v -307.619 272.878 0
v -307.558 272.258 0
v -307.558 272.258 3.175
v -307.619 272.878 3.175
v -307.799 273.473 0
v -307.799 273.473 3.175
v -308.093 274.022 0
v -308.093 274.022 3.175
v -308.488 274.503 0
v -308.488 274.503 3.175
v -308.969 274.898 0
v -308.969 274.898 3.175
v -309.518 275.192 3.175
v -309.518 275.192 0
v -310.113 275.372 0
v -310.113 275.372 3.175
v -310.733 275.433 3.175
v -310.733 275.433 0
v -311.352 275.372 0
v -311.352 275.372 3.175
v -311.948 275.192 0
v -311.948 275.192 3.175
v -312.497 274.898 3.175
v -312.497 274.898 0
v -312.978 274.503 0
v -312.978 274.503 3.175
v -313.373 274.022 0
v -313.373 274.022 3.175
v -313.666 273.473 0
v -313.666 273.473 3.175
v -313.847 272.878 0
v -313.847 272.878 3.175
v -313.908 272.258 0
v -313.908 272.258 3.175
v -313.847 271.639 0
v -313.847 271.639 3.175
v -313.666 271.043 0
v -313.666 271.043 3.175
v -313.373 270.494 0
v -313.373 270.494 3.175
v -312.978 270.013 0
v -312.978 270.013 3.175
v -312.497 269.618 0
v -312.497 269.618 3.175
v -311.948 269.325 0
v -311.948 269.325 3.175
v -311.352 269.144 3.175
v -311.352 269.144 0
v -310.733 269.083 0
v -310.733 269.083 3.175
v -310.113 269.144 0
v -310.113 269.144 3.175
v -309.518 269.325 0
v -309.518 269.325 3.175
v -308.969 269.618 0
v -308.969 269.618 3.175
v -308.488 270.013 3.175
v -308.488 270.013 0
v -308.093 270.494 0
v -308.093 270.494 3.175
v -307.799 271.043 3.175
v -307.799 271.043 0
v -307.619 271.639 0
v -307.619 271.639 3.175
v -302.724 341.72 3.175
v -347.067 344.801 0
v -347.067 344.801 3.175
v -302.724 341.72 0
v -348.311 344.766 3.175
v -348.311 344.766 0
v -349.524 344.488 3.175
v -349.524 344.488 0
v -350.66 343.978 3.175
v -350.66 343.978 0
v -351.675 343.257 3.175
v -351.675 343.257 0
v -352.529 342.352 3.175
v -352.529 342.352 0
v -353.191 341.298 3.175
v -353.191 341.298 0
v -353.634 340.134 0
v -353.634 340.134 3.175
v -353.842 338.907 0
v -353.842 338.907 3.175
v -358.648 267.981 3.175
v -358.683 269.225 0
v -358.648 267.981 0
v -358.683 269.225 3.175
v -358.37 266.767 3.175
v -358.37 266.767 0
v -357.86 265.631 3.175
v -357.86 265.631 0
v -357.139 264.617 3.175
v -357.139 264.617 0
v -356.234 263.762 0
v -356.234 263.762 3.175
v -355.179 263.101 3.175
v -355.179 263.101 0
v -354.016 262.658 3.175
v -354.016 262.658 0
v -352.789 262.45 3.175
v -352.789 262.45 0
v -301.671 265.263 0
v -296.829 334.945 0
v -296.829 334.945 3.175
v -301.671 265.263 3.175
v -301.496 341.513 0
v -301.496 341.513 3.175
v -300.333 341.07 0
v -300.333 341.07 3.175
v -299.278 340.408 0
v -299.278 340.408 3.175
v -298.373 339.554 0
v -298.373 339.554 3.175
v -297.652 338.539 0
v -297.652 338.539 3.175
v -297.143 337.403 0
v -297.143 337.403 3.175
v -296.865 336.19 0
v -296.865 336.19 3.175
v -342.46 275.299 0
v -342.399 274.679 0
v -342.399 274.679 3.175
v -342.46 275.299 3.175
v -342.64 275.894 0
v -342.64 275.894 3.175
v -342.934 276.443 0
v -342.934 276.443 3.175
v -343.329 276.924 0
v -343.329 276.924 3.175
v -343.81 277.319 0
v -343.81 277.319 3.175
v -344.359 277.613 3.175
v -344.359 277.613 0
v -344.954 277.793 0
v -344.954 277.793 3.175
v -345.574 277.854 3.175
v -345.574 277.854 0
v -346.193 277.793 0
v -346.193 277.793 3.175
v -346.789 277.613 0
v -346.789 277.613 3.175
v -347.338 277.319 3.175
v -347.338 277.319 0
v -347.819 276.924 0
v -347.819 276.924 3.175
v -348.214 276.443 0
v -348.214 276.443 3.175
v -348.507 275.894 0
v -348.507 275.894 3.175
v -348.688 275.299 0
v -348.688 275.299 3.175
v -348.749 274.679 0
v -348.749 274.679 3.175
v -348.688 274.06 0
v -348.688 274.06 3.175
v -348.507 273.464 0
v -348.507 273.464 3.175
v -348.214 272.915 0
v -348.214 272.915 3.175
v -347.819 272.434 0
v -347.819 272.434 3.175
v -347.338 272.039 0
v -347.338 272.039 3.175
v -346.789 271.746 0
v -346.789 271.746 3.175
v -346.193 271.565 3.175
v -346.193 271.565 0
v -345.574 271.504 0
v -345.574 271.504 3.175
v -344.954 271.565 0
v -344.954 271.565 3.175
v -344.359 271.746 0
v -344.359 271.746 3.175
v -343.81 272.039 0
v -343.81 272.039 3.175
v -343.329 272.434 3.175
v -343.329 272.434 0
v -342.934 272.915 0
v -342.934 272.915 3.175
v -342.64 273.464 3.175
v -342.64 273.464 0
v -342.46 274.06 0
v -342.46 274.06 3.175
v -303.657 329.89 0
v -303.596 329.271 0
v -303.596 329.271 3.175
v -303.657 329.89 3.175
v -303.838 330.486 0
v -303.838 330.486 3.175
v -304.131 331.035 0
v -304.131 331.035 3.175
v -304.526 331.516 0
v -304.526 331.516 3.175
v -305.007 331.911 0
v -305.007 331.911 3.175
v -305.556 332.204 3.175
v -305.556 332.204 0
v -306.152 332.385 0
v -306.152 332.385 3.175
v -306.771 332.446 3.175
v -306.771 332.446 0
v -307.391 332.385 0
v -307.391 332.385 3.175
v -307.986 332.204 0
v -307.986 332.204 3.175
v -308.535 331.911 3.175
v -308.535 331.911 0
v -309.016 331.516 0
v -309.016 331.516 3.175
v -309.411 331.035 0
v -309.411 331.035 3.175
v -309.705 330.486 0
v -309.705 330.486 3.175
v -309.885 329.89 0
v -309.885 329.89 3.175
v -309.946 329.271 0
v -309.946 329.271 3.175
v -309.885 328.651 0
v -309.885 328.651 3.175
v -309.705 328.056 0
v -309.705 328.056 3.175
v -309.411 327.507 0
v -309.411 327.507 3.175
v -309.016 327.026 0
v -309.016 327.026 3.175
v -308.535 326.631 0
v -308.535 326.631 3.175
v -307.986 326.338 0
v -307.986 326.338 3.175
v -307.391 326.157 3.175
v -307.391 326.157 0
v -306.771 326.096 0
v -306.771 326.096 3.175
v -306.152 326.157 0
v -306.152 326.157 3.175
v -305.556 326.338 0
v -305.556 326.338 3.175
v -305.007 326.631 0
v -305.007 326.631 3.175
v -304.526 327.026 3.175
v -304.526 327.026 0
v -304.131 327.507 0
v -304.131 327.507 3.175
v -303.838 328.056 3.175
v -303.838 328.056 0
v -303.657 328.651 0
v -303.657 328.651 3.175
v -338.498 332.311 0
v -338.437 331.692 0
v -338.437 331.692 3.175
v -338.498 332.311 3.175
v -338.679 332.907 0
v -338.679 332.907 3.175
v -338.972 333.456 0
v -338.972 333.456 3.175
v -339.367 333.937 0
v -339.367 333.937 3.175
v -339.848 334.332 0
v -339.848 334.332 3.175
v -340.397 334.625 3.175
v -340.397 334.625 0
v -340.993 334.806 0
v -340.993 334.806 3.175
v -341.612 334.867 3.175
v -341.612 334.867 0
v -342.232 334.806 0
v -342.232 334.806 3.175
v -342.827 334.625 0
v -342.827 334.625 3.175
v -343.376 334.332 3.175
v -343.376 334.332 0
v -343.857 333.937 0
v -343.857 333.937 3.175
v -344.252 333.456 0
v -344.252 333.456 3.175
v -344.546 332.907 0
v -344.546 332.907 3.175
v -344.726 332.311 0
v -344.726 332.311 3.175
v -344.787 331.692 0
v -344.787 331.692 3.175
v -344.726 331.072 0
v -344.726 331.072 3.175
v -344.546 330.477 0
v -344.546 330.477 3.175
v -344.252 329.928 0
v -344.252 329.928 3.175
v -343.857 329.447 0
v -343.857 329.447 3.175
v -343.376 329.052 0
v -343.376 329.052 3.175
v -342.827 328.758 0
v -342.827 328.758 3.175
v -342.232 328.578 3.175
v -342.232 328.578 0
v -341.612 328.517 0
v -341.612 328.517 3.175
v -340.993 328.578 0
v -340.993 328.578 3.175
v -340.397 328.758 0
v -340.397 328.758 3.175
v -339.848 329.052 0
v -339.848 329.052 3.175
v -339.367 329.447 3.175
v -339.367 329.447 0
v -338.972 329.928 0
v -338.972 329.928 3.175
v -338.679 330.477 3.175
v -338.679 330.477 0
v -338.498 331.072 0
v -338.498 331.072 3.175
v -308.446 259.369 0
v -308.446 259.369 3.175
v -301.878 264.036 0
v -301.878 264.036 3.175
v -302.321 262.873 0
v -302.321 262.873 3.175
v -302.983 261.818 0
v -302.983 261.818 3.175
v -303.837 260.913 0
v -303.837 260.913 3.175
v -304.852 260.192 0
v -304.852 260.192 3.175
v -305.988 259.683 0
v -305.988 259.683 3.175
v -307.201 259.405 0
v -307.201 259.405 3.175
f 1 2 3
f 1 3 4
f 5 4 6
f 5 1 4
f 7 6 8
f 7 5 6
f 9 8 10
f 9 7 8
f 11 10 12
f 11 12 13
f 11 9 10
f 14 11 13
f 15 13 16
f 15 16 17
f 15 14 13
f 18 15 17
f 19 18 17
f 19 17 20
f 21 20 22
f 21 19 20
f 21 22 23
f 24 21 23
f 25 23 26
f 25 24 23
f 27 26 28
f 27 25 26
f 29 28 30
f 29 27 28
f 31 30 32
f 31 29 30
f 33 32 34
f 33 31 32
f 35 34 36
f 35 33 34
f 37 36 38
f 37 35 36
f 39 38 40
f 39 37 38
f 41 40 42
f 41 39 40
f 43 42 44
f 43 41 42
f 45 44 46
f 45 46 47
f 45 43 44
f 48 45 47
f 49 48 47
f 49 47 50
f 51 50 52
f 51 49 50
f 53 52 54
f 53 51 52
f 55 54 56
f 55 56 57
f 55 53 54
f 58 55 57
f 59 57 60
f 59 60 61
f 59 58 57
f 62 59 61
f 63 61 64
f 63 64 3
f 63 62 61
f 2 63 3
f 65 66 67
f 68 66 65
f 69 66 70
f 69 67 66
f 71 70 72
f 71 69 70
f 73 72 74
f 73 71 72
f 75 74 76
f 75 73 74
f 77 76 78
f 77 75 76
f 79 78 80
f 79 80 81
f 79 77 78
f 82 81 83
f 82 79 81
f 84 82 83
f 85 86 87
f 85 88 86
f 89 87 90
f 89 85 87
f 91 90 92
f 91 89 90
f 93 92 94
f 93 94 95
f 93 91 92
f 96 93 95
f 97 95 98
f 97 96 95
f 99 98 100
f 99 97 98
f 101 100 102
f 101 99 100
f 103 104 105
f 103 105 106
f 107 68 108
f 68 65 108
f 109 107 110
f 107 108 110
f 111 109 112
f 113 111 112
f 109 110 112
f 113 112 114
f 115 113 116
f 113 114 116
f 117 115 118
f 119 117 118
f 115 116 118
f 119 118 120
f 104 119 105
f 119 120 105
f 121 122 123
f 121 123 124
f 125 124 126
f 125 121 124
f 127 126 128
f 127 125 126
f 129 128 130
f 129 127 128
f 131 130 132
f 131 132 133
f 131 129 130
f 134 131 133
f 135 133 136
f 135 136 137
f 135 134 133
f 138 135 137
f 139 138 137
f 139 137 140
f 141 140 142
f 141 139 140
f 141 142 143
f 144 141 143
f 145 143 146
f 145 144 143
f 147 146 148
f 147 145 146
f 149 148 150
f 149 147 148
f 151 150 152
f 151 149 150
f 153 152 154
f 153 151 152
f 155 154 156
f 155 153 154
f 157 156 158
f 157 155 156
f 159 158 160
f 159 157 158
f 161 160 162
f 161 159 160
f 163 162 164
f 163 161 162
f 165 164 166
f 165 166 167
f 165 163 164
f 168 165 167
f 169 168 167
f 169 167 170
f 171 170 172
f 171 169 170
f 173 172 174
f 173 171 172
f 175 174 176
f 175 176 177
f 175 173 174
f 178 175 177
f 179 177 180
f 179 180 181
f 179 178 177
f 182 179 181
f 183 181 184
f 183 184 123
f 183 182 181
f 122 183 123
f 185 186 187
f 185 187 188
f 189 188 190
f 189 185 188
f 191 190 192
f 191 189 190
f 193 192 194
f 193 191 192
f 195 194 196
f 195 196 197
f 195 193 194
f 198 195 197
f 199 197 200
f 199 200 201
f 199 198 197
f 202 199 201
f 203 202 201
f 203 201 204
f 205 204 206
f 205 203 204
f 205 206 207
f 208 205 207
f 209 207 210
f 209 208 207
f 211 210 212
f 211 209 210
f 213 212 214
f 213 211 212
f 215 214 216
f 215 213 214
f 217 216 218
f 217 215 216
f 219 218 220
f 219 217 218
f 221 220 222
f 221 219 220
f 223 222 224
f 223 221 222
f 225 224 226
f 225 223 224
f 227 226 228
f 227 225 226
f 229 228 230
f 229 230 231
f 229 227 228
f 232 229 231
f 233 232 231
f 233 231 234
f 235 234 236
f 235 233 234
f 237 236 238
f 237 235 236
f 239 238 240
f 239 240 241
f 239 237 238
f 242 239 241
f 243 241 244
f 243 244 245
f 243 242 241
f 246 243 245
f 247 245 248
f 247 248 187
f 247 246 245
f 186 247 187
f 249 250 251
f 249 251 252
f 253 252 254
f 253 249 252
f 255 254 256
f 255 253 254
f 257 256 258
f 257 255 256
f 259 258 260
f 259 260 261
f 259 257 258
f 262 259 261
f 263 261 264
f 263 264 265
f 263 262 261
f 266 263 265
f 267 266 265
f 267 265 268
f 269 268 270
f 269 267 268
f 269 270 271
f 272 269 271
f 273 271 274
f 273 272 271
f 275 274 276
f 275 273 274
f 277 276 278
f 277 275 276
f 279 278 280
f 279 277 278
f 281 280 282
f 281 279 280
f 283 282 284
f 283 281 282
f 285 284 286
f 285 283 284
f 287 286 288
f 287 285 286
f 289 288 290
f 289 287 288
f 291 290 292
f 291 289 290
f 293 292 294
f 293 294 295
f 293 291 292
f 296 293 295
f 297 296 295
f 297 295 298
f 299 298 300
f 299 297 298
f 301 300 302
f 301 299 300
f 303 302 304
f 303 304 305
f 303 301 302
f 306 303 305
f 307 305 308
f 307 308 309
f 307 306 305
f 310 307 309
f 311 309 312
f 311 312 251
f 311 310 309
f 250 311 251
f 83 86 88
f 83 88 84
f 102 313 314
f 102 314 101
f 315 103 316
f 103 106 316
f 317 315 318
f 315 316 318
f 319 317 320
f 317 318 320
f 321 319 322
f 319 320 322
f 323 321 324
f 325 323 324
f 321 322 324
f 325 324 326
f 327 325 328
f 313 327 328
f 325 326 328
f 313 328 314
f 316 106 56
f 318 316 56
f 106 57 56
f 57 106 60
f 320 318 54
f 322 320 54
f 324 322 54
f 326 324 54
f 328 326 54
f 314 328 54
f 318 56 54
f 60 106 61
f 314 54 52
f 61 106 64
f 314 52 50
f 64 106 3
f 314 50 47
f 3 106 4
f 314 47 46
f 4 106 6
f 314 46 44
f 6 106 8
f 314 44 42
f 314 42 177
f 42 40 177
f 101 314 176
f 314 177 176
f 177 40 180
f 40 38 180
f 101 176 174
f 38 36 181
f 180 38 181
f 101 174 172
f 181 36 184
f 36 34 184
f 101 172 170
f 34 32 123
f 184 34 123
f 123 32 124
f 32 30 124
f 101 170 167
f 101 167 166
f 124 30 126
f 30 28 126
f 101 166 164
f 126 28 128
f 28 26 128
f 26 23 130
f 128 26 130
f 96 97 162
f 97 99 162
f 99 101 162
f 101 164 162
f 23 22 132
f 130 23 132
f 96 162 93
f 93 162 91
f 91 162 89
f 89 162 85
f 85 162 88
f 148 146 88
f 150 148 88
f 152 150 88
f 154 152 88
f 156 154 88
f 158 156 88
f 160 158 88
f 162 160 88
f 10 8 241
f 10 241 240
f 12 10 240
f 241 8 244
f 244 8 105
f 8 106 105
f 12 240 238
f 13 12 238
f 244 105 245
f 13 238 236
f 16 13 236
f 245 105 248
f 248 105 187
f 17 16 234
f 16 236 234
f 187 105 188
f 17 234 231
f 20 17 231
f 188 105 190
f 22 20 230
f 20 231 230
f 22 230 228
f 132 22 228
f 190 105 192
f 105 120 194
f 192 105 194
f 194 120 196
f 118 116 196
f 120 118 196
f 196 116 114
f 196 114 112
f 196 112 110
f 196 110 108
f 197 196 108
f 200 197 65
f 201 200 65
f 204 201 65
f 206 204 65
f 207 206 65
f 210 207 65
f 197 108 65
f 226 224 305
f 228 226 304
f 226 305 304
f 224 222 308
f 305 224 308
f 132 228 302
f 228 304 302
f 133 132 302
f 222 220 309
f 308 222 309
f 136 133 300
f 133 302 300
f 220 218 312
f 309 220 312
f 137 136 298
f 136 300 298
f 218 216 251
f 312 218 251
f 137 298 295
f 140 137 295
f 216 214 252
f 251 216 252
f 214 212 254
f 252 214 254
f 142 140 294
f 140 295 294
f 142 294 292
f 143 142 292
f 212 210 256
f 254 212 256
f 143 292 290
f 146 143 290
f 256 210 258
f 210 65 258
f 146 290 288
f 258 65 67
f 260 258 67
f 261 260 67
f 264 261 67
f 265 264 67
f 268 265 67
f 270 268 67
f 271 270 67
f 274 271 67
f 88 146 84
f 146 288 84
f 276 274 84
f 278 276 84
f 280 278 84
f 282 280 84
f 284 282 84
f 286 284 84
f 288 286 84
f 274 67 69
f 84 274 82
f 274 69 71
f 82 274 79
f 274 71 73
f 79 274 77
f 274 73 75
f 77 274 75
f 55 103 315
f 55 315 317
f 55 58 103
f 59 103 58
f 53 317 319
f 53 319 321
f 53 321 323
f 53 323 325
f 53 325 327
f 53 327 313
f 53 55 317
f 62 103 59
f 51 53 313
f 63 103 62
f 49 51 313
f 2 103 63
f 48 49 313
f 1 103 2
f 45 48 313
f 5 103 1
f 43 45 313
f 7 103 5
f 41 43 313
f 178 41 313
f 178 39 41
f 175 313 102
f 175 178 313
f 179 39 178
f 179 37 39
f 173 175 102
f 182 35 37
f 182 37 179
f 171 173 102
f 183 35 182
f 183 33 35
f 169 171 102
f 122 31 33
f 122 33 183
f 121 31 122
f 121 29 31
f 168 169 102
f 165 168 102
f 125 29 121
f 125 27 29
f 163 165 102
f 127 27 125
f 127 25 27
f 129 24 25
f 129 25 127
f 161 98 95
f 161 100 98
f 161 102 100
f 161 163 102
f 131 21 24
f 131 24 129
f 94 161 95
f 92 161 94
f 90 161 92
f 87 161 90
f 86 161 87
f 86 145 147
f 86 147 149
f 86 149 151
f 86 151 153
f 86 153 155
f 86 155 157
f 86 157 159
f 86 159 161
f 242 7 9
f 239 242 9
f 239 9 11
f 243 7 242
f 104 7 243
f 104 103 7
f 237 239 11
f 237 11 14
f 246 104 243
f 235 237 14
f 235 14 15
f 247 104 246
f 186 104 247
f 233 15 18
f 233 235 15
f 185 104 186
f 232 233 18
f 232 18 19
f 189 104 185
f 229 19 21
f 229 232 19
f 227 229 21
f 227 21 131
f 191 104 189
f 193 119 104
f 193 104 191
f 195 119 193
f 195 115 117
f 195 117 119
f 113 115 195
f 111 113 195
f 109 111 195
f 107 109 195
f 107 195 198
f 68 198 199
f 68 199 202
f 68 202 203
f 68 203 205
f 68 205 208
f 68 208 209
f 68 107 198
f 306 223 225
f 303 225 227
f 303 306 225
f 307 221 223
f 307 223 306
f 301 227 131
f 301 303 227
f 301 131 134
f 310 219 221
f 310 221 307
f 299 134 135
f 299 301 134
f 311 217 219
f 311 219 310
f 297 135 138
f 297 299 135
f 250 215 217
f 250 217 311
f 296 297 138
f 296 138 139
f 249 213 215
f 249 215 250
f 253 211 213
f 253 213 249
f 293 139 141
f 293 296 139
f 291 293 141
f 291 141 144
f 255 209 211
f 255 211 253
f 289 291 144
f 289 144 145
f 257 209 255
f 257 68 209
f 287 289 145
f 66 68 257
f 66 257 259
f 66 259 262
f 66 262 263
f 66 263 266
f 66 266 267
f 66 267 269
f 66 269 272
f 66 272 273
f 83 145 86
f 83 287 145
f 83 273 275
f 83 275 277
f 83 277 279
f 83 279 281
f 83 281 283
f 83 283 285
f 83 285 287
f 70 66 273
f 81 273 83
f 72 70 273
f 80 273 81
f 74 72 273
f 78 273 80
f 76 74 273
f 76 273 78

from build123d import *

# Parameters (mm, degrees)
SKETCH1_R           = 3.175
BOSS_EXTRUDE1_DEPTH = 3.175
FILLET1_R           = 6.35


with BuildPart() as part:
    # Sketch1 → Boss-Extrude1 (new body)
    with BuildSketch(Plane.XY):
        Polygon((-353.401390066, 345.241574638), (-296.388854277, 341.280102322), (-302.110980955, 258.928661738), (-359.123516744, 262.890134053), align=None)
        with Locations((-306.771270757, 329.270895311)):
            Circle(SKETCH1_R, mode=Mode.SUBTRACT)
        with Locations((-341.61226485, 331.691795059)):
            Circle(SKETCH1_R, mode=Mode.SUBTRACT)
        with Locations((-345.573737165, 274.67925927)):
            Circle(SKETCH1_R, mode=Mode.SUBTRACT)
        with Locations((-310.732743072, 272.258359522)):
            Circle(SKETCH1_R, mode=Mode.SUBTRACT)
    extrude(amount=BOSS_EXTRUDE1_DEPTH)

    # Fillet1
    fillet1_edges = [part.edges().sort_by_distance(p)[0] for p in [
        (-353.401390066, 345.241574638, 1.5875),
        (-296.388854277, 341.280102322, 1.5875),
        (-302.110980955, 258.928661738, 1.5875),
        (-359.123516744, 262.890134053, 1.5875),
    ]]
    fillet(fillet1_edges, radius=FILLET1_R)


solid = part.part
